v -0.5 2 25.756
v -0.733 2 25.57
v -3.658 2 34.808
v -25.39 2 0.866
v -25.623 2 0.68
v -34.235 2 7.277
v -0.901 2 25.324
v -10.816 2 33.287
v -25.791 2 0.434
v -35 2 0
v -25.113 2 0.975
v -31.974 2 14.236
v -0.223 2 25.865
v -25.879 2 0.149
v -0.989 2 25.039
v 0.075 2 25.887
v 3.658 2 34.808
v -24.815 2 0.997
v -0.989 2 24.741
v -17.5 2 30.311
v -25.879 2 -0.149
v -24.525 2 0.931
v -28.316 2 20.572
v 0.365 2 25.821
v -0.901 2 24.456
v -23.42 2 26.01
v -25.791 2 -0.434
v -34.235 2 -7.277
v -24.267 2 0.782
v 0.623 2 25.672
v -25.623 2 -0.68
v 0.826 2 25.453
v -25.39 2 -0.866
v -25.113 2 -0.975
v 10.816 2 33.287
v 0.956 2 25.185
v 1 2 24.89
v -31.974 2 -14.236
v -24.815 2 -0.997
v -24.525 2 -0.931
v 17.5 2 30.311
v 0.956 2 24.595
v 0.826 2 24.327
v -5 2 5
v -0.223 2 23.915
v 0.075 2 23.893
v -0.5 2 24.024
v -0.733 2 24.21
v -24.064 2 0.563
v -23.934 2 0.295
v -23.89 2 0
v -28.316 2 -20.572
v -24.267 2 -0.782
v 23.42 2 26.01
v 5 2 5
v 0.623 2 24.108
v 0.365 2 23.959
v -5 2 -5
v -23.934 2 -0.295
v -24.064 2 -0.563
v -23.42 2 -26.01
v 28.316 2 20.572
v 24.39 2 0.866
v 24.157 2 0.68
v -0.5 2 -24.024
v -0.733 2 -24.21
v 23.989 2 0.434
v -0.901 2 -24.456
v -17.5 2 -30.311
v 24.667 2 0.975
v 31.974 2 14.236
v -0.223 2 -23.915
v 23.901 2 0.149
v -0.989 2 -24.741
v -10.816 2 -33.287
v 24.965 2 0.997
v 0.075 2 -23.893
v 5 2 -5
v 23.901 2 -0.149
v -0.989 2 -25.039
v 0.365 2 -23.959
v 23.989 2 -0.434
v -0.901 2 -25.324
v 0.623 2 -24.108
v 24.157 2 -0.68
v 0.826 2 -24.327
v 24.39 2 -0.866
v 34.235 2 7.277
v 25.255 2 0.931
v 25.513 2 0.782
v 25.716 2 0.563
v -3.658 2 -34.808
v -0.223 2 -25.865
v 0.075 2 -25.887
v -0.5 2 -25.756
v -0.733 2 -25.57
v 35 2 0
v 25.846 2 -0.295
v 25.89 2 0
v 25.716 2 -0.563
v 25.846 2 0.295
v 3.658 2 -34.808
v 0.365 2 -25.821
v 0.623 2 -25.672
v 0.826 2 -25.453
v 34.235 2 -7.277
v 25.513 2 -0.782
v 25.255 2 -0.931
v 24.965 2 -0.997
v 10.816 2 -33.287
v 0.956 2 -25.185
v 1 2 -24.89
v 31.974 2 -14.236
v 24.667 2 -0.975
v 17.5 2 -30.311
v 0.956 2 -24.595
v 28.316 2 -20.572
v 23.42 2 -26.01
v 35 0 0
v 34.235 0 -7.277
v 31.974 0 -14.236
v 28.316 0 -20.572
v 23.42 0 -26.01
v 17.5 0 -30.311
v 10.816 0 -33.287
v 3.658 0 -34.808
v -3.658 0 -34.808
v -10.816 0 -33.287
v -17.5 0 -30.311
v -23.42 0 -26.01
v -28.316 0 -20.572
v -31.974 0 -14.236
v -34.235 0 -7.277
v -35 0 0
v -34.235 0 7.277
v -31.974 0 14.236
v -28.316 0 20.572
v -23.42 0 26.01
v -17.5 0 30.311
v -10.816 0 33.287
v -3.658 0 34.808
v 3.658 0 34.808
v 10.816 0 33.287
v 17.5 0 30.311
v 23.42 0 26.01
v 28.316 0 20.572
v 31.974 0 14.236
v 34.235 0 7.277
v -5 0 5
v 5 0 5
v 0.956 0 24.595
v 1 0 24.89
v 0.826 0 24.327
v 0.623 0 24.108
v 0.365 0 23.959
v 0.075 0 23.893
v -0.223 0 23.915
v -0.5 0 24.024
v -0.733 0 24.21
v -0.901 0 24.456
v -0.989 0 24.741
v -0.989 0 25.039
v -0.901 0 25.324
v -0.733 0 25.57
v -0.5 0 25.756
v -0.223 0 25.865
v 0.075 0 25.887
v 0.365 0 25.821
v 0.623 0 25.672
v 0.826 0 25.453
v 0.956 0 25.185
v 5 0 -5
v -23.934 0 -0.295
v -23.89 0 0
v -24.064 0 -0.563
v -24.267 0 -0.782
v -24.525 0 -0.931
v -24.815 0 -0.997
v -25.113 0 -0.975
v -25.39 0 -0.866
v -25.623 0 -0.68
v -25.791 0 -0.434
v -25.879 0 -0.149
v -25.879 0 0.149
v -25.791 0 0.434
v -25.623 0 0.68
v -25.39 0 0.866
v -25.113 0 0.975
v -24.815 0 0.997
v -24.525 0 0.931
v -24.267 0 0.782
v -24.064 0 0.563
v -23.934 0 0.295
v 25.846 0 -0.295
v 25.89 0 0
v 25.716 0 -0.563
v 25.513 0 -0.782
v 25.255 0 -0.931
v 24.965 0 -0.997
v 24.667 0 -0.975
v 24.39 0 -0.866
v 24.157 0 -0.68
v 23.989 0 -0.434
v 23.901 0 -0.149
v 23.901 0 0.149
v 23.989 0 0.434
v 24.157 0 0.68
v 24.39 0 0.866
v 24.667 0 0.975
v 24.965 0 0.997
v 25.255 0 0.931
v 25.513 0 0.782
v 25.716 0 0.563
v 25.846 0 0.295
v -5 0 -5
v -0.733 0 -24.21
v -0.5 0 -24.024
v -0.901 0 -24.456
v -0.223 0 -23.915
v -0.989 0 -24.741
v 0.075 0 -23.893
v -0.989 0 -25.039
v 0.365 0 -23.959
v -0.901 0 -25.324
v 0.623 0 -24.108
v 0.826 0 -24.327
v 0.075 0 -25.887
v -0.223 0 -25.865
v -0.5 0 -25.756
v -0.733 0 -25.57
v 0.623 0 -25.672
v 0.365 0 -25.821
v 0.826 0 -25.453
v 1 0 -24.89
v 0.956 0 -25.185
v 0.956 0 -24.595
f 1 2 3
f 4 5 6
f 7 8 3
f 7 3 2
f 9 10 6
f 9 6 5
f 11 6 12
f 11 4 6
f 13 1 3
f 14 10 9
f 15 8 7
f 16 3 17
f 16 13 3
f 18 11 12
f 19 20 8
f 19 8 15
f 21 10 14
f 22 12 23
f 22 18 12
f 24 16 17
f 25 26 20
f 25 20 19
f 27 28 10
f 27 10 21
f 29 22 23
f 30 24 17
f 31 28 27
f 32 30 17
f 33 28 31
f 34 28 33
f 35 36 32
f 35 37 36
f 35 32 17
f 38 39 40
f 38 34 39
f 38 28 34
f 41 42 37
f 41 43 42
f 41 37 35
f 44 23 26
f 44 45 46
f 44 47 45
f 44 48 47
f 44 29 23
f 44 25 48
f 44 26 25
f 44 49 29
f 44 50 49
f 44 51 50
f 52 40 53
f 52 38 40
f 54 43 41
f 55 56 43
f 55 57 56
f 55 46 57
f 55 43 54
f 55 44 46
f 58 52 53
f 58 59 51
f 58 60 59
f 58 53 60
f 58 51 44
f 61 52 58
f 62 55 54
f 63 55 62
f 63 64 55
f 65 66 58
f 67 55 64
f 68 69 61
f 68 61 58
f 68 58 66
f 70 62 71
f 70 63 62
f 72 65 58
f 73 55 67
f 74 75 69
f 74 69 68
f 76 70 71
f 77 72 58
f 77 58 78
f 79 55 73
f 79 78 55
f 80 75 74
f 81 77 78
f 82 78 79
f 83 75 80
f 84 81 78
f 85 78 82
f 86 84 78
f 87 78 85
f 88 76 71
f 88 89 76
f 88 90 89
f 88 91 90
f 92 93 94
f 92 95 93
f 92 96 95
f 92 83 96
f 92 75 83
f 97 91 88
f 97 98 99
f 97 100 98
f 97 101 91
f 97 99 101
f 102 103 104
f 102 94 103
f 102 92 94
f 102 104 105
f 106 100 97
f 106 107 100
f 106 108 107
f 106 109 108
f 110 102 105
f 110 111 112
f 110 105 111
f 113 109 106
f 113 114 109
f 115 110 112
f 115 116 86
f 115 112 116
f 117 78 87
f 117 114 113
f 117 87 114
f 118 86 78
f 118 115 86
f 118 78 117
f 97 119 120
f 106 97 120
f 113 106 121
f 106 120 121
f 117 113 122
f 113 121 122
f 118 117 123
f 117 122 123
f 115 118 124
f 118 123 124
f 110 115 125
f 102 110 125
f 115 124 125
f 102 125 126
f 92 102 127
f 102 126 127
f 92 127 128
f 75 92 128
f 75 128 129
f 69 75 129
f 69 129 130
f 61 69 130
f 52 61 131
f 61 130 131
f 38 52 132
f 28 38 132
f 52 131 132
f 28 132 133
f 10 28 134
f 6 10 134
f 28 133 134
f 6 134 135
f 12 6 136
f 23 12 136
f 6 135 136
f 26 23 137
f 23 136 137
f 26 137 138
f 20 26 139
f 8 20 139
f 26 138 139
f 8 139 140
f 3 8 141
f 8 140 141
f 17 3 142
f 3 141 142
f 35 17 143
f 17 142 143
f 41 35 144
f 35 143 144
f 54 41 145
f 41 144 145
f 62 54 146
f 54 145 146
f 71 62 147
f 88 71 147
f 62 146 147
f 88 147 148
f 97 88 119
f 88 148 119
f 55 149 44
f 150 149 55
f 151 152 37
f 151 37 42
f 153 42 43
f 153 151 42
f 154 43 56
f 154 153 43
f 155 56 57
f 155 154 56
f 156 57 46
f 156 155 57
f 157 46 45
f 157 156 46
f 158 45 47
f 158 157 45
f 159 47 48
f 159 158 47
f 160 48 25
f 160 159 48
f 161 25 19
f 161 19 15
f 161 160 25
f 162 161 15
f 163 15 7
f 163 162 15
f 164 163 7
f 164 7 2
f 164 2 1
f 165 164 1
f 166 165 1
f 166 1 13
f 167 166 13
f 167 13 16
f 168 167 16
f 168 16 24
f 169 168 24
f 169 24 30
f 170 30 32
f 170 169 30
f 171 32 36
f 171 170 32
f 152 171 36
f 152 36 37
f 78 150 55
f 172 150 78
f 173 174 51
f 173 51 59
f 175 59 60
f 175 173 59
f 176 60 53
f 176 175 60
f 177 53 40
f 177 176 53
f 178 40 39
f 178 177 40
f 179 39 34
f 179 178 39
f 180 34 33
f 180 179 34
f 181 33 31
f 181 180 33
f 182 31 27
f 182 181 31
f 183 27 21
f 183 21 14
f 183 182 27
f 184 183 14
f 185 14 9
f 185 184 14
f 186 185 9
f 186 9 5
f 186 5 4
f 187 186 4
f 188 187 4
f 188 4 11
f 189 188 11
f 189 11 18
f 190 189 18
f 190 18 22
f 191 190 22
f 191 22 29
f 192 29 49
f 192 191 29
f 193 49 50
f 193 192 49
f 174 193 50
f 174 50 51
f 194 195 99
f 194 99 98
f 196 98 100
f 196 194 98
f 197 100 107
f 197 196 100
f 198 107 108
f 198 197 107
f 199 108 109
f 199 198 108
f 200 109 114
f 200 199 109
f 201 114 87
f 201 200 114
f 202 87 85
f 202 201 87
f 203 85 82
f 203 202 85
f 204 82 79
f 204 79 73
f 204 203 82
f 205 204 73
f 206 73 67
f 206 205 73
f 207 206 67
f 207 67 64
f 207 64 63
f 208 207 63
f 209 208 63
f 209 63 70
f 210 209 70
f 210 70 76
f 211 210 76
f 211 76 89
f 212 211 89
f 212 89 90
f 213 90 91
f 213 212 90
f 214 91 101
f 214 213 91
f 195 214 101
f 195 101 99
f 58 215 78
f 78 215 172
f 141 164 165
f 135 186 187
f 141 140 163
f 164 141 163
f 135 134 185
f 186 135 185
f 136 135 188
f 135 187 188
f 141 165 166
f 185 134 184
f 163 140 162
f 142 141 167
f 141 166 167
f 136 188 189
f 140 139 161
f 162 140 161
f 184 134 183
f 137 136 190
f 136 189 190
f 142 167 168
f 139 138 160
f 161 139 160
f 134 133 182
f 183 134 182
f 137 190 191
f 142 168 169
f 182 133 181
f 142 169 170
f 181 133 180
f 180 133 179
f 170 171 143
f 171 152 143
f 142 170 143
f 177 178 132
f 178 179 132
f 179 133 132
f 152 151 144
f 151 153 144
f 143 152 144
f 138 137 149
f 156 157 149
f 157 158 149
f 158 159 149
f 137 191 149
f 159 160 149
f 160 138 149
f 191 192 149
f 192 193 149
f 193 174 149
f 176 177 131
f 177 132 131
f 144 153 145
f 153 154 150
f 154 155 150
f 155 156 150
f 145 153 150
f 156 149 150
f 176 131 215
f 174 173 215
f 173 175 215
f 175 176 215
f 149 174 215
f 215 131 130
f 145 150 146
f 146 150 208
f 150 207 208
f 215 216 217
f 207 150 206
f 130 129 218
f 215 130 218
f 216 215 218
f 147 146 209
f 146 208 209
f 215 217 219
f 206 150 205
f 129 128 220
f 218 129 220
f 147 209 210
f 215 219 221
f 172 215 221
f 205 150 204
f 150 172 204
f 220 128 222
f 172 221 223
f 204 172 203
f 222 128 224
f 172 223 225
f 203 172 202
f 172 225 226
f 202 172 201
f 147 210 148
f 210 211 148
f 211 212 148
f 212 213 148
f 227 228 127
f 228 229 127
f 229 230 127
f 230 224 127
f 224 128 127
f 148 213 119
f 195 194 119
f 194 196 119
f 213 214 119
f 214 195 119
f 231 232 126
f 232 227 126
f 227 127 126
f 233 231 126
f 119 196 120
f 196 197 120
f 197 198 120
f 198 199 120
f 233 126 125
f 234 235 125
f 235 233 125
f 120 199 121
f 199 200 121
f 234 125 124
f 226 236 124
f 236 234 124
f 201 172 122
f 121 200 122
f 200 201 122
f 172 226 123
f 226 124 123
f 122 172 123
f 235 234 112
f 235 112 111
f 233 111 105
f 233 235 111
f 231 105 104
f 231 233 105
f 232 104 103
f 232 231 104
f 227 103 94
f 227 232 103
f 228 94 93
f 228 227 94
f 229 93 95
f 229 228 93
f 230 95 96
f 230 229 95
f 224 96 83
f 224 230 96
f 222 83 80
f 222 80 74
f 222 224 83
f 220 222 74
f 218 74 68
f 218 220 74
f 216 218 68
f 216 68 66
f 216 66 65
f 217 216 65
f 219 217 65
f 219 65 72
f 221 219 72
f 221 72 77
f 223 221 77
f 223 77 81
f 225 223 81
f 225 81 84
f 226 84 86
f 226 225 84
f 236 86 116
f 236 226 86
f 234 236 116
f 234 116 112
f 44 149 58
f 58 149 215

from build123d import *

# Parameters (mm, degrees)
SKETCH1_R           = 35
SKETCH1_R_2         = 1
SKETCH1_W           = 10
SKETCH1_H           = 10
BOSS_EXTRUDE1_DEPTH = 2


with BuildPart() as part:
    # Sketch1 → Boss-Extrude1 (new body)
    with BuildSketch(Plane(origin=(0, 0, 0), x_dir=(1, 0, 0), z_dir=(0, 1, 0))):
        Circle(SKETCH1_R)
        with Locations((0, 24.89)):
            Circle(SKETCH1_R_2, mode=Mode.SUBTRACT)
        with Locations((24.89, 0)):
            Circle(SKETCH1_R_2, mode=Mode.SUBTRACT)
        with Locations((0, -24.89)):
            Circle(SKETCH1_R_2, mode=Mode.SUBTRACT)
        with Locations((-24.89, 0)):
            Circle(SKETCH1_R_2, mode=Mode.SUBTRACT)
        Rectangle(SKETCH1_W, SKETCH1_H, mode=Mode.SUBTRACT)
    extrude(amount=BOSS_EXTRUDE1_DEPTH)


solid = part.part
